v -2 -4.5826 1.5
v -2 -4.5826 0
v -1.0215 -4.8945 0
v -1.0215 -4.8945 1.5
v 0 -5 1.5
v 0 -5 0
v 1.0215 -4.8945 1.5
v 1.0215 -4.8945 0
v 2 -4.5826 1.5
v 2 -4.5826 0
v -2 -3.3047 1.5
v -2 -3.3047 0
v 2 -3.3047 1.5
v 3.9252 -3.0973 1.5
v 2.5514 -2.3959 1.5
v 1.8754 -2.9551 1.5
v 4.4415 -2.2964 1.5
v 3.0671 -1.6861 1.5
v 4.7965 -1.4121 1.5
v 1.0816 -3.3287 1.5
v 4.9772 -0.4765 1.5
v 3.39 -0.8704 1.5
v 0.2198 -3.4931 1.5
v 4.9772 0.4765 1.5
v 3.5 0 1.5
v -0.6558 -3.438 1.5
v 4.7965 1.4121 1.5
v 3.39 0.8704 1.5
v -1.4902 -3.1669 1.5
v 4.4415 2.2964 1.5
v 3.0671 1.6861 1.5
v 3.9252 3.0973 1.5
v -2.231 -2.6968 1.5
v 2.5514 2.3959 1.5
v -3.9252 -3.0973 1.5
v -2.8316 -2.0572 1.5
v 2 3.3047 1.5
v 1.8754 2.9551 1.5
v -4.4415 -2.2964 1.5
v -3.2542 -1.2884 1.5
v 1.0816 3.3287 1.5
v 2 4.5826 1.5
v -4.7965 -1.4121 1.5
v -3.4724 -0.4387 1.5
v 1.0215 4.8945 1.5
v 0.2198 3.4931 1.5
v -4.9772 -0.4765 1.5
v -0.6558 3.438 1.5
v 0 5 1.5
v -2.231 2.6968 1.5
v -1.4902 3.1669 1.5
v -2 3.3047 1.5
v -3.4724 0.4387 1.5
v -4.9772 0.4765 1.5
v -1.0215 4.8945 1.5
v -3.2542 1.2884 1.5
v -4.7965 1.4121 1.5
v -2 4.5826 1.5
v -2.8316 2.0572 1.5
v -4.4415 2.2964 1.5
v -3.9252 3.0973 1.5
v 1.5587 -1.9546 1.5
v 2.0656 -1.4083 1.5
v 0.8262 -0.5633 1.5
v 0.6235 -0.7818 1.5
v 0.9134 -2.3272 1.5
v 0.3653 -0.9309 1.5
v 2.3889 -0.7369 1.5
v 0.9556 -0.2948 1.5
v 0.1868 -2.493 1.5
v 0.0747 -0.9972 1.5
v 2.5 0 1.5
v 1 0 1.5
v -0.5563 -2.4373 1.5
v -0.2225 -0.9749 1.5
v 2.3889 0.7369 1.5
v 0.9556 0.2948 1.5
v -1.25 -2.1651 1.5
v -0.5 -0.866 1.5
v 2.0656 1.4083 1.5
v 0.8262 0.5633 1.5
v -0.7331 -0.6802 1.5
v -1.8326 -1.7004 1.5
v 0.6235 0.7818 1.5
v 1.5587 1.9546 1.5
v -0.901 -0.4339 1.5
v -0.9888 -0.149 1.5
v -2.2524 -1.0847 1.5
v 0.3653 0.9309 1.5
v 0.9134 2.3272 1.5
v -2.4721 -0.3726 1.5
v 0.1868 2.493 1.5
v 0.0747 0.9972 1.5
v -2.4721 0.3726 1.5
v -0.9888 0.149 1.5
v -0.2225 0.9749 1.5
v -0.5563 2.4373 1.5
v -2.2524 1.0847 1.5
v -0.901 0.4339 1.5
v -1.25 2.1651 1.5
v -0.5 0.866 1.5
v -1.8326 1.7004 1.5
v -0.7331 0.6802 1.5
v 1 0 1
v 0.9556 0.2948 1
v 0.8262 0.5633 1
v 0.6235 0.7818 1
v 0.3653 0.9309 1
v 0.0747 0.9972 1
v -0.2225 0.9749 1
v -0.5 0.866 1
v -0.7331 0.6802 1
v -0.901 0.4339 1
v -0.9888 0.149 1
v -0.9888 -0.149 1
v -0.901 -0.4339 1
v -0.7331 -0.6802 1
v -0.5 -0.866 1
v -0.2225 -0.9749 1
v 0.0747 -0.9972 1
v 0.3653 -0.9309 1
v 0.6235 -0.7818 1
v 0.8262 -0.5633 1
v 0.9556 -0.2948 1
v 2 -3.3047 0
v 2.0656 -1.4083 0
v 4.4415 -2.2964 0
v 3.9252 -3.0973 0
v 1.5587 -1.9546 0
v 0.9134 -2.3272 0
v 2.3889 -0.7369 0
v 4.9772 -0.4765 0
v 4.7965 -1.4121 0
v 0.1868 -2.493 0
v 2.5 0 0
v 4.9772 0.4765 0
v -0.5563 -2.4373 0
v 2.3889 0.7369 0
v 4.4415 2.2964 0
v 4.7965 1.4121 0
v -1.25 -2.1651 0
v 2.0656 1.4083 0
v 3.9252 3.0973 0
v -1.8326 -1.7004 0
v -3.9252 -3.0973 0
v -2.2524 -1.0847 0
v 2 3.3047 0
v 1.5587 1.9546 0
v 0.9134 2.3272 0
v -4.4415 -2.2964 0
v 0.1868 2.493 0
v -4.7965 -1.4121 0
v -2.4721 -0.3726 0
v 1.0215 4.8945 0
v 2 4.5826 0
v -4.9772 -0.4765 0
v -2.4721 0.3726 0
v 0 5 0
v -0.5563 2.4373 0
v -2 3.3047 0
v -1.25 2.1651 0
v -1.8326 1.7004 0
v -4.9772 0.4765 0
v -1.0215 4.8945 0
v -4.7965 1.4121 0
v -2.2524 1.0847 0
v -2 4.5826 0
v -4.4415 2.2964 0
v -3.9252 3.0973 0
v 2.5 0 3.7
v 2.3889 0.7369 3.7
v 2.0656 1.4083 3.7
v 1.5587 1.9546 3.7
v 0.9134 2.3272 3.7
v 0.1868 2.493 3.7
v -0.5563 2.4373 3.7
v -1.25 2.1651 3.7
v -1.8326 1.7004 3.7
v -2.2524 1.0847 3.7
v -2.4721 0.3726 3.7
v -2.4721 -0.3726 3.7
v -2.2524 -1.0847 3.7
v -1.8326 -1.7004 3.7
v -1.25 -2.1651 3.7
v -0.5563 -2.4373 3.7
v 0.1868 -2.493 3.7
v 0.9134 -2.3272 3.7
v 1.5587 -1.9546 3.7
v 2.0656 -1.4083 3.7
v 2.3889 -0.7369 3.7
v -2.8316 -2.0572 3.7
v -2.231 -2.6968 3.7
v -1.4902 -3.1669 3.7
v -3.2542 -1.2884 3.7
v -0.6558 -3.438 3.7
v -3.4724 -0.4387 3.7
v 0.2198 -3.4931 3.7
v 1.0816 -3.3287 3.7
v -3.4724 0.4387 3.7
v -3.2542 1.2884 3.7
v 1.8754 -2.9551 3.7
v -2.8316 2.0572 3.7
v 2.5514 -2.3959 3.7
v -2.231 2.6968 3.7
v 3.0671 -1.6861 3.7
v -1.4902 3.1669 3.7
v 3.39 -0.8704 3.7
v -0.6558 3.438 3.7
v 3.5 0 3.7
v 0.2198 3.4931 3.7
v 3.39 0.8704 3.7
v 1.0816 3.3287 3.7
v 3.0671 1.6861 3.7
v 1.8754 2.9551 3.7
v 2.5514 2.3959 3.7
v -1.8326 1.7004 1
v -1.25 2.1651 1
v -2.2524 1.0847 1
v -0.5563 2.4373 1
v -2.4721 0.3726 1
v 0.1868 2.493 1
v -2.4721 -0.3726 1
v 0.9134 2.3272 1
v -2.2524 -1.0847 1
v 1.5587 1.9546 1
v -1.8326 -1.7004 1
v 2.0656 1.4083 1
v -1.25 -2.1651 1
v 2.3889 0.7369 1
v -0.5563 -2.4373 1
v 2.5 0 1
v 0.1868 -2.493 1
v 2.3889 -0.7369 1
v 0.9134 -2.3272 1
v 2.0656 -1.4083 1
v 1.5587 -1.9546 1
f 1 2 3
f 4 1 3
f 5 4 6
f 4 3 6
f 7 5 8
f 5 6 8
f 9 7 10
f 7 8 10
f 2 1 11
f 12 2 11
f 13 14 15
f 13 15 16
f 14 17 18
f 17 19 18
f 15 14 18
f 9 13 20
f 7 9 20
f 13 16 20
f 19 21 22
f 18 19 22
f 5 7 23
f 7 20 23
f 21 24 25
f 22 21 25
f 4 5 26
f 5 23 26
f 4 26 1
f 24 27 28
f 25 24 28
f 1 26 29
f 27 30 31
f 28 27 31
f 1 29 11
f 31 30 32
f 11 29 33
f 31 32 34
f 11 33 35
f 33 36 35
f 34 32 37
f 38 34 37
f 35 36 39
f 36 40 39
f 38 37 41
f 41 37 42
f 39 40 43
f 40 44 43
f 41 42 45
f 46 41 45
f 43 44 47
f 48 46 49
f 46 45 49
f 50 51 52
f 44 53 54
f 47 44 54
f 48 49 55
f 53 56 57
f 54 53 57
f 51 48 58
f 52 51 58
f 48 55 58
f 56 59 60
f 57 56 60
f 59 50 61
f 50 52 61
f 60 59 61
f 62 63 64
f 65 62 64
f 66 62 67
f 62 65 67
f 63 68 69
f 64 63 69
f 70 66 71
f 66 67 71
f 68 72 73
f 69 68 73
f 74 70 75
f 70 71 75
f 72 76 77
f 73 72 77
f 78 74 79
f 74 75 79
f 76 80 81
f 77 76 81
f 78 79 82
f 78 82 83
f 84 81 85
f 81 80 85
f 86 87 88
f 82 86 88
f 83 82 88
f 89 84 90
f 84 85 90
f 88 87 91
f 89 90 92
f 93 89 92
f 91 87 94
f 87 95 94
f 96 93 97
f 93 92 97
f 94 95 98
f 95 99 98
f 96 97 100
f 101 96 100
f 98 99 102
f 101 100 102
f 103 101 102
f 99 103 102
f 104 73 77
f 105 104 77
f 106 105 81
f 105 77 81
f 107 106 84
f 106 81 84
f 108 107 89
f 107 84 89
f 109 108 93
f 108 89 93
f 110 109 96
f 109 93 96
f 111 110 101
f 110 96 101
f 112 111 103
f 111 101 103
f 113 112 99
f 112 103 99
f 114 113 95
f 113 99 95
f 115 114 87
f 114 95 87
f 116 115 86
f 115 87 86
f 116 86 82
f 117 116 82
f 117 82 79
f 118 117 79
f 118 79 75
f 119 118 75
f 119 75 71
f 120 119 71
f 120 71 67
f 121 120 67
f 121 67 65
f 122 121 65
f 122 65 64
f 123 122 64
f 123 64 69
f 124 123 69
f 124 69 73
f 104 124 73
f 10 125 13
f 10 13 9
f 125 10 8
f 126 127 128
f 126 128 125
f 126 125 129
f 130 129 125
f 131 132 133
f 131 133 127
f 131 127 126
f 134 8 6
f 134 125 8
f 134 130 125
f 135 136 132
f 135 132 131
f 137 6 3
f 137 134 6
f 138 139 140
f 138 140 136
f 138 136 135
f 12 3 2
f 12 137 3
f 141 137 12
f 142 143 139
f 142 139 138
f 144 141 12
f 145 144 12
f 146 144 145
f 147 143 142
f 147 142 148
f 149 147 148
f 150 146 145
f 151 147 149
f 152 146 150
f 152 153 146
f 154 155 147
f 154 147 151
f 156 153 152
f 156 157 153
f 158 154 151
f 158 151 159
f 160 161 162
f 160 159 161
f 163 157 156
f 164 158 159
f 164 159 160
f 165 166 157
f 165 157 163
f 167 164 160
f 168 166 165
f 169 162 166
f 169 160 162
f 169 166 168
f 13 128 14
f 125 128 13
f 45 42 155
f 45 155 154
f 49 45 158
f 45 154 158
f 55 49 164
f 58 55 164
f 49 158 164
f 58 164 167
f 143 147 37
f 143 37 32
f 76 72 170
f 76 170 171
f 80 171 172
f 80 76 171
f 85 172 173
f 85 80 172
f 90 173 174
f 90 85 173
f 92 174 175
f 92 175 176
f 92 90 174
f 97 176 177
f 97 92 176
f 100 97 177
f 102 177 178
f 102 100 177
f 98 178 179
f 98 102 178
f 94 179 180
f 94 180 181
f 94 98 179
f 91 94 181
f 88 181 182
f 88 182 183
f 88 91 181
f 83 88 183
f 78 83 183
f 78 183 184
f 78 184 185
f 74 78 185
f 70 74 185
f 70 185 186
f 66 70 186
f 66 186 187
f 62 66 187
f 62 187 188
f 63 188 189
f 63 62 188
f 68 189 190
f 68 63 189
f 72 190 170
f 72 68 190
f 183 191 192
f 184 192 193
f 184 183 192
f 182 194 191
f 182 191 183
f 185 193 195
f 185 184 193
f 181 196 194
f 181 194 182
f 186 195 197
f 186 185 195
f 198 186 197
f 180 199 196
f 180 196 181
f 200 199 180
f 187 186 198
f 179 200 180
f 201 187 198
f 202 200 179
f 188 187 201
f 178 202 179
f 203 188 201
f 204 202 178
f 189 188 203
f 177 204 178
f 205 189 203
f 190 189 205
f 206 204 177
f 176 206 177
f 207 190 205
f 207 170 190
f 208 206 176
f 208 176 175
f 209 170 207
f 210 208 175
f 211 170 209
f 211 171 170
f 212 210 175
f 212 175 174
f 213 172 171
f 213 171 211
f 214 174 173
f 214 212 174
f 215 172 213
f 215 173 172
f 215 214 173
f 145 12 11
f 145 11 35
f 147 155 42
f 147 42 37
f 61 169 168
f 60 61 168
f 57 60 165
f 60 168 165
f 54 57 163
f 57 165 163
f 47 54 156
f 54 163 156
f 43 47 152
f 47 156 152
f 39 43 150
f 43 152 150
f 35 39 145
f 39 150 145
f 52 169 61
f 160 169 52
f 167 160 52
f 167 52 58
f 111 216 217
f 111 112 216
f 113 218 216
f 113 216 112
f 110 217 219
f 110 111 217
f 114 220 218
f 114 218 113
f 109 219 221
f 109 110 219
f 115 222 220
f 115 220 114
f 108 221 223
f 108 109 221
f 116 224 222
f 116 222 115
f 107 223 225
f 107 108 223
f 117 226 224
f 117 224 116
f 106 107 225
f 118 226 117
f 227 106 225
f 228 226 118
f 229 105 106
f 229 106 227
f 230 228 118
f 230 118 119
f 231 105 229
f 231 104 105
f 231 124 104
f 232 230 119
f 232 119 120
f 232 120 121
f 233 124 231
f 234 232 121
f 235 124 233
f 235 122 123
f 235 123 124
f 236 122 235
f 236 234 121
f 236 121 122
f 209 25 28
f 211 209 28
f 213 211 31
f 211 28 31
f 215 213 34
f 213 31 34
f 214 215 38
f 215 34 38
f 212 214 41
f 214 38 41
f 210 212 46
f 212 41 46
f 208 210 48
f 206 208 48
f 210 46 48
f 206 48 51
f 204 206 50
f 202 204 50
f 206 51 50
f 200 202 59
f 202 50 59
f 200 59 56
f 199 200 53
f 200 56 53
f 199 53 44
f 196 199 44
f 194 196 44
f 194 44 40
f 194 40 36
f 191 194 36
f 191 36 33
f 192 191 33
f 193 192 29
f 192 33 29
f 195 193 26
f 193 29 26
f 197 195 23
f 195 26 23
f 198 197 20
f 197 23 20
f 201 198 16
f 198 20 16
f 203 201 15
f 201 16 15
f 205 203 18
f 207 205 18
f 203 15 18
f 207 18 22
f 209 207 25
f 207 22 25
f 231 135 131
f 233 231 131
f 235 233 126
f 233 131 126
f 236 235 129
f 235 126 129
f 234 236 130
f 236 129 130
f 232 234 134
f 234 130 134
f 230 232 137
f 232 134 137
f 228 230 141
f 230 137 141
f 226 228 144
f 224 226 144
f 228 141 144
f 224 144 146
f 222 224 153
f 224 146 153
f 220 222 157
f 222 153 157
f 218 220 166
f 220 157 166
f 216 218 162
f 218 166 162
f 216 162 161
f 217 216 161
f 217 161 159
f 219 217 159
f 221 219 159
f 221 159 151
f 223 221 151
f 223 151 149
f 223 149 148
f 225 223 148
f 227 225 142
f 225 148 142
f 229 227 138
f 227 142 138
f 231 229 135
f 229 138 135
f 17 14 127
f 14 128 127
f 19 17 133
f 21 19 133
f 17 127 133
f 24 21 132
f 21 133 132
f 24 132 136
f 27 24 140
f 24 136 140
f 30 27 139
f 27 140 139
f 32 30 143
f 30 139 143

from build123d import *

# Parameters (mm, degrees)
BOSS_EXTRUDE1_DEPTH = 1.5
SKETCH2_R           = 3.5
SKETCH2_R_2         = 2.5
BOSS_EXTRUDE2_DEPTH = 2.2
CUT_EXTRUDE1_REACH  = 20.87
SKETCH3_R           = 1
SKETCH4_R           = 2.5
CUT_EXTRUDE2_DEPTH  = 1
CUT_EXTRUDE4_START  = -1.5
SKETCH5_R           = 17.5
SKETCH5_R_2         = 5
CUT_EXTRUDE4_DEPTH  = 1.5


with BuildPart() as part:
    # Sketch1 → Boss-Extrude1 (new body)
    with BuildSketch(Plane.XY):
        with BuildLine():
            Line((2, 7.75863865), (2, 3.304737557))
            Line((2, 3.304737557), (14.214285714, 1.988487272))
            ThreePointArc((14.214285714, 1.988487272), (16, 0), (14.214285714, -1.988487272))
            Line((14.214285714, -1.988487272), (2, -3.304737557))
            Line((2, -3.304737557), (2, -7.75863865))
            ThreePointArc((2, -7.75863865), (0, -9.75863865), (-2, -7.75863865))
            Line((-2, -7.75863865), (-2, -3.304737557))
            Line((-2, -3.304737557), (-14.214285714, -1.988487272))
            ThreePointArc((-14.214285714, -1.988487272), (-16, 0), (-14.214285714, 1.988487272))
            Line((-14.214285714, 1.988487272), (-2, 3.304737557))
            Line((-2, 3.304737557), (-2, 7.75863865))
            ThreePointArc((-2, 7.75863865), (0, 9.75863865), (2, 7.75863865))
        make_face()
    extrude(amount=BOSS_EXTRUDE1_DEPTH)

    # Sketch2 → Boss-Extrude2 (add)
    with BuildSketch(Plane.XY.offset(1.5)):
        Circle(SKETCH2_R)
        Circle(SKETCH2_R_2, mode=Mode.SUBTRACT)
    extrude(amount=BOSS_EXTRUDE2_DEPTH)

    # Sketch3 → Cut-Extrude1 (cut, up to next)
    with BuildSketch(Plane.XY.offset(1.5), mode=Mode.PRIVATE) as cut_extrude1_sk1:
        Circle(SKETCH3_R)
    cut_extrude1_tool1 = extrude(cut_extrude1_sk1.sketch, amount=-CUT_EXTRUDE1_REACH, mode=Mode.PRIVATE) & part.part
    add(cut_extrude1_tool1.solids().sort_by_distance((0, 0, 1.5))[0], mode=Mode.SUBTRACT)

    # Sketch4 → Cut-Extrude2 (cut)
    with BuildSketch(Plane(origin=(0, 0, 0), x_dir=(-1, 0, 0), z_dir=(0, 0, -1))):
        with Locations(Location((0, 0, 0), (0, 0, 180))):
            Circle(SKETCH4_R)
    extrude(amount=-CUT_EXTRUDE2_DEPTH, mode=Mode.SUBTRACT)

    # Sketch5 → Cut-Extrude4 (cut)
    with BuildSketch(Plane.XY.offset(1.5).offset(CUT_EXTRUDE4_START)):
        Circle(SKETCH5_R)
        Circle(SKETCH5_R_2, mode=Mode.SUBTRACT)
    extrude(amount=CUT_EXTRUDE4_DEPTH, mode=Mode.SUBTRACT)


solid = part.part
